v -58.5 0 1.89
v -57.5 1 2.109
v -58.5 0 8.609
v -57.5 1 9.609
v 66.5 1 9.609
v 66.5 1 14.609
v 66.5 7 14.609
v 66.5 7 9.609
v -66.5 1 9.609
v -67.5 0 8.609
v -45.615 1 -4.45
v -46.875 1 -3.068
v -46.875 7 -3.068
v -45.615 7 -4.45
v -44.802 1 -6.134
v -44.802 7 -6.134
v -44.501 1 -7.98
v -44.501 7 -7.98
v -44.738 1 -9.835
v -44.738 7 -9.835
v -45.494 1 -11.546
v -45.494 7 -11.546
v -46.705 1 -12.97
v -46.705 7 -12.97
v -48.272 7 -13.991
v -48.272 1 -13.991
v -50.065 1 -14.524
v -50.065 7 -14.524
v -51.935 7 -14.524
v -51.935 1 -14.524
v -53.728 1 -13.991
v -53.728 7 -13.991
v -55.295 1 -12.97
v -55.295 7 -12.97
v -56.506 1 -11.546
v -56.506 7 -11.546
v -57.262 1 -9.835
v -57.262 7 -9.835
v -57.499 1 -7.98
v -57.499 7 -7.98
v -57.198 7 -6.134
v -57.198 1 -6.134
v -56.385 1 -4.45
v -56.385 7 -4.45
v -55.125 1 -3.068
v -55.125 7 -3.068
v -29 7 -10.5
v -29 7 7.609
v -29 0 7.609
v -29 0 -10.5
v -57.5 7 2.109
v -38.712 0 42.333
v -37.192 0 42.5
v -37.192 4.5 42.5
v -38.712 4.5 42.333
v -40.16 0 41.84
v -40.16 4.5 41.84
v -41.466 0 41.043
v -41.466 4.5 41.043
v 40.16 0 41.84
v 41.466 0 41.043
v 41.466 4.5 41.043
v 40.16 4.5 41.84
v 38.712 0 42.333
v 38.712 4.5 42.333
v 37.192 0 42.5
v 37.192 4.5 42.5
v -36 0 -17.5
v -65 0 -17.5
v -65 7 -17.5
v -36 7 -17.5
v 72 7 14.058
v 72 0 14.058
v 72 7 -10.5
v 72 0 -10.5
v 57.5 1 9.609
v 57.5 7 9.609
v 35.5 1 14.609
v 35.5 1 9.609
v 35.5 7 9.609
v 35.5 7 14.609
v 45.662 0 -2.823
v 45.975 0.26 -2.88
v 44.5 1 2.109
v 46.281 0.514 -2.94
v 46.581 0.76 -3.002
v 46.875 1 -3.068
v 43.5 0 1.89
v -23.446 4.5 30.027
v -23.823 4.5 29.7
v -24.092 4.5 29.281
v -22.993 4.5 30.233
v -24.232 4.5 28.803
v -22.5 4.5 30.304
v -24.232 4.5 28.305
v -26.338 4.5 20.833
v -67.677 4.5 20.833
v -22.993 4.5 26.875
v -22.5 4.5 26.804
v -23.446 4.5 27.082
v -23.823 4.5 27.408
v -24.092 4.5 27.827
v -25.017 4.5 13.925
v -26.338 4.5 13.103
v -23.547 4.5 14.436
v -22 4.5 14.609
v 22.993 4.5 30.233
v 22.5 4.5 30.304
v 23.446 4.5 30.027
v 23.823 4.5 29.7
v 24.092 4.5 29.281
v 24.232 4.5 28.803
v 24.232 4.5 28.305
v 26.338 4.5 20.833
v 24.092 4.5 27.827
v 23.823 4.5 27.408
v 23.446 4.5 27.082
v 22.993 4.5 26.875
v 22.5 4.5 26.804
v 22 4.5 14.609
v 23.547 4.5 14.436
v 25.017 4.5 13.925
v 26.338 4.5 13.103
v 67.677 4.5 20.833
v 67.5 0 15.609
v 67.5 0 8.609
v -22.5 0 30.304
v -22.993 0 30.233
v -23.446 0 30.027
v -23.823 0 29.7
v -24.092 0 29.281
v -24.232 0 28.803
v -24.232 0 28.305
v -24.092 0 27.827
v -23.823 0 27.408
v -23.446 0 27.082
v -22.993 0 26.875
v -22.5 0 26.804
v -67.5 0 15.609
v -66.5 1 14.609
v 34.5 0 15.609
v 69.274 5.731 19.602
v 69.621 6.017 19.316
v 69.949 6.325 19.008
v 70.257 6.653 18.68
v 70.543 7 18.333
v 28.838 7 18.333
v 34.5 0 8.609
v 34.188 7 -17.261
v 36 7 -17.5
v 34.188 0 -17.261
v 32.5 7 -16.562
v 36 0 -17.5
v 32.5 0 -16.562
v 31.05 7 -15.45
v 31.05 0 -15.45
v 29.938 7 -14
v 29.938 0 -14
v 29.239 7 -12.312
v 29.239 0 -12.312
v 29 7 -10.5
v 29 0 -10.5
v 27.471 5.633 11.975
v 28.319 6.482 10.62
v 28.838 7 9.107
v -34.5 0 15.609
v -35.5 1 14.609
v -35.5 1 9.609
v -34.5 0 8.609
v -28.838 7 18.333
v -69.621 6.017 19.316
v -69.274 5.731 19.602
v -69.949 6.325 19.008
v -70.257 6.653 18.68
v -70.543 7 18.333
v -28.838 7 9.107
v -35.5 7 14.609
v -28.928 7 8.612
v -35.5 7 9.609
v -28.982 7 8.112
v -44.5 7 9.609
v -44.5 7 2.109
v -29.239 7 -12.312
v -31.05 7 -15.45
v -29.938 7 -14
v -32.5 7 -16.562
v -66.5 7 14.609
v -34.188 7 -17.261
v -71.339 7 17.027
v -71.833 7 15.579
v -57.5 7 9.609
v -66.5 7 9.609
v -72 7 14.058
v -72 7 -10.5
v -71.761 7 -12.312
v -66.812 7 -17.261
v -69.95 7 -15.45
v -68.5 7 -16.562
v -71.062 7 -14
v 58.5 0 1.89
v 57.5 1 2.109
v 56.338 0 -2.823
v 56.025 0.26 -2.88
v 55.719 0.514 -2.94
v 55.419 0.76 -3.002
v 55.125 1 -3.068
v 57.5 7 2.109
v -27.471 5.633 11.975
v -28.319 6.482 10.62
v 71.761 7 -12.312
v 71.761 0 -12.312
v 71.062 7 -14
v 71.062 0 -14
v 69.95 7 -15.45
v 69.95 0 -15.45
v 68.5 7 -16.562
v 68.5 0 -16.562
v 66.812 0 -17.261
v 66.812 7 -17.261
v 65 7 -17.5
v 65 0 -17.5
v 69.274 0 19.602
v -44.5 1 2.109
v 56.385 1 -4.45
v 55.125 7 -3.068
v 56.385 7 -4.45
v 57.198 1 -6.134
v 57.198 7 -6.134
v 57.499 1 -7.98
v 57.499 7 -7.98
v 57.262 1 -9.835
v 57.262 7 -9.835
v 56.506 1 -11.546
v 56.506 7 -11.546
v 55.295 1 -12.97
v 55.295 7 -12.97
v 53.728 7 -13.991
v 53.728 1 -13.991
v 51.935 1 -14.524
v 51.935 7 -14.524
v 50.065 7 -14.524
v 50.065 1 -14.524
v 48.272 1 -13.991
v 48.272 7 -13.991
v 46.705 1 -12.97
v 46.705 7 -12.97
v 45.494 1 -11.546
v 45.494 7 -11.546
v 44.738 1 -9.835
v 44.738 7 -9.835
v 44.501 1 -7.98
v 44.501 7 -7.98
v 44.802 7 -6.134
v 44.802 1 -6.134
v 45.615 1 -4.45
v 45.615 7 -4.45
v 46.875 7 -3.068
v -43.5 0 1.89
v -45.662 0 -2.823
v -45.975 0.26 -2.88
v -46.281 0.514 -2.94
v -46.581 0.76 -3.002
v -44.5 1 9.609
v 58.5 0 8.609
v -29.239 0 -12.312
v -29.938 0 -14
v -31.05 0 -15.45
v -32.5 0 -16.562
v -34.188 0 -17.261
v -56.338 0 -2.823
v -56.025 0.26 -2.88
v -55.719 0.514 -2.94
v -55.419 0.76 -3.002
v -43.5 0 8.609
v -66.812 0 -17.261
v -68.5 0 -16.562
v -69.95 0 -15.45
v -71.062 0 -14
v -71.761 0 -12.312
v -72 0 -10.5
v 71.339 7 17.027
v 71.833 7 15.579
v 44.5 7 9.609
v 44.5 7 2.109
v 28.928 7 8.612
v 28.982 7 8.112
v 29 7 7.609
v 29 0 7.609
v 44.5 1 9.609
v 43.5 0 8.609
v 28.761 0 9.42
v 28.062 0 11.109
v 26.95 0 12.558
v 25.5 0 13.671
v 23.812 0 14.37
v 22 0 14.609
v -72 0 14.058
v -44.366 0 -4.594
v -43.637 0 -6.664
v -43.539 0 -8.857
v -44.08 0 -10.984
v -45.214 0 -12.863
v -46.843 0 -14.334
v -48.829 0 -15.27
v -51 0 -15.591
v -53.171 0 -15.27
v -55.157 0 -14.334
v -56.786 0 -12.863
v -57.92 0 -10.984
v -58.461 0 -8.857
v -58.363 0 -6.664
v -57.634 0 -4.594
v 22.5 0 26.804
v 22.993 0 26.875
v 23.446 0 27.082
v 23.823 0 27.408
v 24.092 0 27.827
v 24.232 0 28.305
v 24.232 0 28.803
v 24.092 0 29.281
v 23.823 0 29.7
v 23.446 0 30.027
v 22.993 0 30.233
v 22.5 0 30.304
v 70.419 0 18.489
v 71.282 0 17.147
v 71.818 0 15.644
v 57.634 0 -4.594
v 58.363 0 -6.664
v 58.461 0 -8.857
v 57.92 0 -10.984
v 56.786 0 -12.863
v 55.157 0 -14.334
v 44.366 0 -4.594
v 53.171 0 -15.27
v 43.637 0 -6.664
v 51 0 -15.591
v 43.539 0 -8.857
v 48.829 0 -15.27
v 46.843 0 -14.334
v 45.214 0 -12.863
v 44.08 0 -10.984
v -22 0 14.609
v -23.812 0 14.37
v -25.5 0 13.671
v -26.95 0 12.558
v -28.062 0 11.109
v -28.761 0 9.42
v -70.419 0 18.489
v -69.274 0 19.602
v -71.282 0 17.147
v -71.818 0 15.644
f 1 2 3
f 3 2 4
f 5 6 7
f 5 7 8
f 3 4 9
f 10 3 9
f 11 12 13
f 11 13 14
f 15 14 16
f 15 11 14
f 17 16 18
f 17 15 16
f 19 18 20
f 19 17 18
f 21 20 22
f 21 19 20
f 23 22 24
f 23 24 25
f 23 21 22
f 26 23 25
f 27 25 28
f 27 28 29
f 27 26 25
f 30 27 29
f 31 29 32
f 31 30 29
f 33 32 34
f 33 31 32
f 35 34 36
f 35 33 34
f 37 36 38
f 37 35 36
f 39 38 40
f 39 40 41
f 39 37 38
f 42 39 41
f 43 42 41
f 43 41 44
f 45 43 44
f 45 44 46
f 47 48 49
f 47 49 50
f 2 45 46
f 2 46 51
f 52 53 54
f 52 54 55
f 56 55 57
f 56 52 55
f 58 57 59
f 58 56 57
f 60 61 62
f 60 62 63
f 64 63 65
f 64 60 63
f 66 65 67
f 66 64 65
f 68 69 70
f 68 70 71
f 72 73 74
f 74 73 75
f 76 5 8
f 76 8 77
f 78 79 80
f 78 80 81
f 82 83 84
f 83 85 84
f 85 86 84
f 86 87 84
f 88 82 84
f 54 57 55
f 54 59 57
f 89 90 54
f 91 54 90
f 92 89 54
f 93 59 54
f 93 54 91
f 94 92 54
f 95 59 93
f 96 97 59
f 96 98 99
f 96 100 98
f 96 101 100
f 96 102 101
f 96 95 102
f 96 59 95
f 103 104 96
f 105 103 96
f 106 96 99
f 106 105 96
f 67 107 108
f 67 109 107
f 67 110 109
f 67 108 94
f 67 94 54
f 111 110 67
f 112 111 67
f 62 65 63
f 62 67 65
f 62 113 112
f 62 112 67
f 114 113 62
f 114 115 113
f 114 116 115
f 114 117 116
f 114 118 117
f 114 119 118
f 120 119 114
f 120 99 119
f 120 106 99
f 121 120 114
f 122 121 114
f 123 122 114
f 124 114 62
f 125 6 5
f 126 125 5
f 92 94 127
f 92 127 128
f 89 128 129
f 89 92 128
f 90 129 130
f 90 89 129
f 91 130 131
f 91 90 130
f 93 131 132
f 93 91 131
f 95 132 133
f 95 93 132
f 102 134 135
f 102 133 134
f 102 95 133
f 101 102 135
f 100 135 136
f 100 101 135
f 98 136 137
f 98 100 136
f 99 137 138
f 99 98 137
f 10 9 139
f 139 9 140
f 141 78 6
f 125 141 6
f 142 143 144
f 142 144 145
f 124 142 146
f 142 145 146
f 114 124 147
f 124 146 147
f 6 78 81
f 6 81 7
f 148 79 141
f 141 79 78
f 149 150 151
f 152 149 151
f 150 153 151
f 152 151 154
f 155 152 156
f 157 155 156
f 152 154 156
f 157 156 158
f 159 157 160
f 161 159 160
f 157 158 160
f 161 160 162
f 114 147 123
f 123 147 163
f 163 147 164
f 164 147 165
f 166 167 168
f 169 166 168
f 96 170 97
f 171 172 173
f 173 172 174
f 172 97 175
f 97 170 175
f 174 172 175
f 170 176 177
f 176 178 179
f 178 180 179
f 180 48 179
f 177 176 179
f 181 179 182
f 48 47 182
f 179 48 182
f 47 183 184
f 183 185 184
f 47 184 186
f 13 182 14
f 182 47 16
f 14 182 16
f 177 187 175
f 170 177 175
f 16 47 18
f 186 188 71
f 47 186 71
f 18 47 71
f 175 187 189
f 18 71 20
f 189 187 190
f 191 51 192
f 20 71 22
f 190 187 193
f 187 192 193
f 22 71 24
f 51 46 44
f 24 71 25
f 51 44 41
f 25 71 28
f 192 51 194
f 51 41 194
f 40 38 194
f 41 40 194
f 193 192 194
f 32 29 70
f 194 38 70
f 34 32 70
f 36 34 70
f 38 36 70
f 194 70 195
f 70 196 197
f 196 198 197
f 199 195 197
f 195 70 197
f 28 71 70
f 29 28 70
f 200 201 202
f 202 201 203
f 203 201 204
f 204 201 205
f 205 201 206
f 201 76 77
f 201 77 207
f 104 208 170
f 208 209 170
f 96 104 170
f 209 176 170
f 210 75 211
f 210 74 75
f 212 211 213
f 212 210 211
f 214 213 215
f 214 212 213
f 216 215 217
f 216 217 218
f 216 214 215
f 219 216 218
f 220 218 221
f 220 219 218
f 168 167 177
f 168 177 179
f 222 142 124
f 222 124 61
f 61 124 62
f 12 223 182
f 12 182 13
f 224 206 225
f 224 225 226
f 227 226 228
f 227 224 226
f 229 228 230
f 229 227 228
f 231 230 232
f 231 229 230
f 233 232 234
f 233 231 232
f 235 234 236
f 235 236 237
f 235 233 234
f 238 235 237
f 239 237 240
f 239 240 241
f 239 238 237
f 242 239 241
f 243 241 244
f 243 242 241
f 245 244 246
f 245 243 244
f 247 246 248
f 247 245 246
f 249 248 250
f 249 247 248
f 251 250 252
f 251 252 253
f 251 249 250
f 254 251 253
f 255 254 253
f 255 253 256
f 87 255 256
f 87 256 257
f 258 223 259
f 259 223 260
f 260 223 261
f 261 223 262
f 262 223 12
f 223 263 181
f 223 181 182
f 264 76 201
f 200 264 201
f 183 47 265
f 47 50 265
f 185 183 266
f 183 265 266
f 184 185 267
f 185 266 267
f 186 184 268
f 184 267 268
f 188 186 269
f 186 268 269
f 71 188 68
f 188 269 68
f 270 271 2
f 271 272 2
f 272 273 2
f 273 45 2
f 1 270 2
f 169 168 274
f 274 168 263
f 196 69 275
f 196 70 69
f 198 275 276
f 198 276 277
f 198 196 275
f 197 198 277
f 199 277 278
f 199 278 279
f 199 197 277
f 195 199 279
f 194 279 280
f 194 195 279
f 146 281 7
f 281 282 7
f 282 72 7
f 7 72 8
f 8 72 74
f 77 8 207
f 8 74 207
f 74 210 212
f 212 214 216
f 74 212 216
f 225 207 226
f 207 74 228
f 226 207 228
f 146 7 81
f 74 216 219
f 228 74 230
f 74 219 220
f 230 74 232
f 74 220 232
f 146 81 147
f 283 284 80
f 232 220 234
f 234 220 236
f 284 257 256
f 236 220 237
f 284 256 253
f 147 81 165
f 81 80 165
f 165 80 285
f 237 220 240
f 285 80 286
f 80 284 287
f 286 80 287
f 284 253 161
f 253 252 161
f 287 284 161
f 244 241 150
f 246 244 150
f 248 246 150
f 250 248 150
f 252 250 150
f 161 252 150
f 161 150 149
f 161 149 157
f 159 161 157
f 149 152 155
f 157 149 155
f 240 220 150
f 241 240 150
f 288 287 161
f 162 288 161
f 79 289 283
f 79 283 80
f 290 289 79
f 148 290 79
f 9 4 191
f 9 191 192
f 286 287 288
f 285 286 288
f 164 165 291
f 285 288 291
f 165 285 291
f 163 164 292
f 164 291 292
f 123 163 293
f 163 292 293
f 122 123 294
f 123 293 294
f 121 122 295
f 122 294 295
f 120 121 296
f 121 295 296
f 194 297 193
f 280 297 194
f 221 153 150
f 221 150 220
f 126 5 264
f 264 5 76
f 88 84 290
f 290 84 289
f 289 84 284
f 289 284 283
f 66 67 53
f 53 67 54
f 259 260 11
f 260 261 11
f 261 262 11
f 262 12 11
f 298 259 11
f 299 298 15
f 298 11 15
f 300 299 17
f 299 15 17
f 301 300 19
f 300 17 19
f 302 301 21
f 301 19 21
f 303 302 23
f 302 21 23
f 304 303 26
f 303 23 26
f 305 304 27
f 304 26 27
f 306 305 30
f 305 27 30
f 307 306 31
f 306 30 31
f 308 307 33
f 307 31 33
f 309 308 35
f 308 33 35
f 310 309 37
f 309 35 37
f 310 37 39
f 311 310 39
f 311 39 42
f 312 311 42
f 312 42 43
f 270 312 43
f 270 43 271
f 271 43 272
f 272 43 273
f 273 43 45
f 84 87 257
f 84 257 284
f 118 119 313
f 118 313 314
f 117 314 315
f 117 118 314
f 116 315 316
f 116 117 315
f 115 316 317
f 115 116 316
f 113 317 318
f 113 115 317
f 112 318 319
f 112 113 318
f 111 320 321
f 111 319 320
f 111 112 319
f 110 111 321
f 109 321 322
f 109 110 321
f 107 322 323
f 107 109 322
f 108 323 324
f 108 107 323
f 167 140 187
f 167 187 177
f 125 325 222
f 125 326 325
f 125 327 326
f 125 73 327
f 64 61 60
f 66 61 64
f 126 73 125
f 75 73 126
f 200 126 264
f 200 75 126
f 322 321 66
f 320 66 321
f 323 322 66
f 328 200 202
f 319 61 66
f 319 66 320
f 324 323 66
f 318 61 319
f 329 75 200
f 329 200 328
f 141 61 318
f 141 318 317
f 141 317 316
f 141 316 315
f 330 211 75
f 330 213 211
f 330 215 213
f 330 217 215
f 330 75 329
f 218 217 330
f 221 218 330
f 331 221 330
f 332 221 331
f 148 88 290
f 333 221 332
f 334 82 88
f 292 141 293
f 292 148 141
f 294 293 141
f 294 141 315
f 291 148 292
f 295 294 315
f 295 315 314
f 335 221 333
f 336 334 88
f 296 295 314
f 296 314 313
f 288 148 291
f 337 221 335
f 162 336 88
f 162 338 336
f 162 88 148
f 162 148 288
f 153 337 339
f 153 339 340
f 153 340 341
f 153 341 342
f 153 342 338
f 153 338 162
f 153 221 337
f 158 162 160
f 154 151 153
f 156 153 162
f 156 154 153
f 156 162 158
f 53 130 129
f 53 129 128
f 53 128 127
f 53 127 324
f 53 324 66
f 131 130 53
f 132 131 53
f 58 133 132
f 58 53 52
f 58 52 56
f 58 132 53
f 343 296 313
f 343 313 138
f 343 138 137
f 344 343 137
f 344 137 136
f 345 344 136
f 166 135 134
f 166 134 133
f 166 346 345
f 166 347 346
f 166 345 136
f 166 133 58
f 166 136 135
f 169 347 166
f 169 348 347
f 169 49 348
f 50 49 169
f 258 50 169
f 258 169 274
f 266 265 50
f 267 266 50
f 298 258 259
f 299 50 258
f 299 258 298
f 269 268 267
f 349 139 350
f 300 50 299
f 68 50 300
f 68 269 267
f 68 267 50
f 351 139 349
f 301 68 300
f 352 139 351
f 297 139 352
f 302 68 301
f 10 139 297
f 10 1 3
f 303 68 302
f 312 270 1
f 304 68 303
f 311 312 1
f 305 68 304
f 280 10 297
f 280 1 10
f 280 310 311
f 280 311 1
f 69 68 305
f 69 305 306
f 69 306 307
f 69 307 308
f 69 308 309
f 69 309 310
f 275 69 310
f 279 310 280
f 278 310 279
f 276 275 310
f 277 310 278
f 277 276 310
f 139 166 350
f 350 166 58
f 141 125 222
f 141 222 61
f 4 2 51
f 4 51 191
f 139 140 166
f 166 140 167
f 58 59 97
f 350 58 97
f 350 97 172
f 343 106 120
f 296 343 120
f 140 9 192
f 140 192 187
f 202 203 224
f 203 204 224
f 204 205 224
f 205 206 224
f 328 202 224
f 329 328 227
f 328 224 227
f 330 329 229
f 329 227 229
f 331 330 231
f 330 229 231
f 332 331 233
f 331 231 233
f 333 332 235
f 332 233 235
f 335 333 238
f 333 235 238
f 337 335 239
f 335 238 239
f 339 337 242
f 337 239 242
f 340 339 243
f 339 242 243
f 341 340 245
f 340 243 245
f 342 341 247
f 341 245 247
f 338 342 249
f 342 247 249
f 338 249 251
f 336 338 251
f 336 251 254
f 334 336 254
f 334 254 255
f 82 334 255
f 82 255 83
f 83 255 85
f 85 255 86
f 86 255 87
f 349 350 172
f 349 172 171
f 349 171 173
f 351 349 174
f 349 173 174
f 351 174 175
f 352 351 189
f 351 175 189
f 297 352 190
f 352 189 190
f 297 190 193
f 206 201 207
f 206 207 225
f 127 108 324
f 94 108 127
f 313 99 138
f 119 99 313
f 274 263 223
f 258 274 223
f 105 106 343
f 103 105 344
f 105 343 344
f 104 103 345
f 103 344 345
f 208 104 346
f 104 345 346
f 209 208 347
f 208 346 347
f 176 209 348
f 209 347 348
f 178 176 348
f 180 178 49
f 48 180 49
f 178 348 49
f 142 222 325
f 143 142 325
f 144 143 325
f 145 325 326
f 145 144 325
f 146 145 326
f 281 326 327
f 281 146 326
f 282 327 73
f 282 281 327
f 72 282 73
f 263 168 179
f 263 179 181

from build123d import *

# Parameters (mm, degrees)
SKETCH1_W           = 144
SKETCH1_H           = 35
BOSS_EXTRUDE1_DEPTH = 7
BOSS_EXTRUDE2_DEPTH = 7
SKETCH8_W           = 58
SKETCH8_H           = 32.108669786
CUT_EXTRUDE5_DEPTH  = 84.900238379
FILLET1_R           = 7
CUT_EXTRUDE3_DEPTH  = 84.900238379
CUT_EXTRUDE4_DEPTH  = 2.5
CHAMFER2_SIZE       = 2.5
CHAMFER3_SIZE       = 1


with BuildPart() as part:
    # Sketch1 → Boss-Extrude1 (new body)
    with BuildSketch(Plane(origin=(0, 0, 0), x_dir=(1, 0, 0), z_dir=(0, 1, 0))):
        Rectangle(SKETCH1_W, SKETCH1_H)
        with BuildLine():
            Line((-55.125, 3.06794739), (-57.5, -2.108669786))
            Line((-57.5, -2.108669786), (-57.5, -9.608669786))
            Line((-57.5, -9.608669786), (-66.5, -9.608669786))
            Line((-66.5, -9.608669786), (-66.5, -14.608669786))
            Line((-66.5, -14.608669786), (-35.5, -14.608669786))
            Line((-35.5, -14.608669786), (-35.5, -9.608669786))
            Line((-35.5, -9.608669786), (-44.5, -9.608669786))
            Line((-44.5, -9.608669786), (-44.5, -2.108669786))
            Line((-44.5, -2.108669786), (-46.875, 3.06794739))
            ThreePointArc((-46.875, 3.06794739), (-51, 14.591330214), (-55.125, 3.06794739))
        make_face(mode=Mode.SUBTRACT)
        with BuildLine():
            Line((46.875, 3.06794739), (44.5, -2.108669786))
            Line((44.5, -2.108669786), (44.5, -9.608669786))
            Line((44.5, -9.608669786), (35.5, -9.608669786))
            Line((35.5, -9.608669786), (35.5, -14.608669786))
            Line((35.5, -14.608669786), (66.5, -14.608669786))
            Line((66.5, -14.608669786), (66.5, -9.608669786))
            Line((66.5, -9.608669786), (57.5, -9.608669786))
            Line((57.5, -9.608669786), (57.5, -2.108669786))
            Line((57.5, -2.108669786), (55.125, 3.06794739))
            ThreePointArc((55.125, 3.06794739), (51, 14.591330214), (46.875, 3.06794739))
        make_face(mode=Mode.SUBTRACT)
    extrude(amount=BOSS_EXTRUDE1_DEPTH)

    # Sketch6 → Boss-Extrude2 (add)
    with BuildSketch(Plane(origin=(0, 7, 0), x_dir=(1, 0, 0), z_dir=(0, 1, 0))):
        Polygon((72, -17.5), (39.577085299, -42.5), (-39.577085299, -42.5), (-72, -17.5), align=None)
    extrude(amount=-BOSS_EXTRUDE2_DEPTH)

    # Sketch8 → Cut-Extrude5 (cut, through all)
    with BuildSketch(Plane(origin=(0, 7, 0), x_dir=(1, 0, 0), z_dir=(0, 1, 0))):
        with Locations((0, 1.445665107)):
            Rectangle(SKETCH8_W, SKETCH8_H)
    extrude(amount=-CUT_EXTRUDE5_DEPTH, mode=Mode.SUBTRACT)

    # Fillet1
    fillet1_edges = [part.edges().sort_by_distance(p)[0] for p in [
        (29, 3.5, -17.5),
        (29, 3.5, 14.608669786),
        (-72, 3.5, -17.5),
        (72, 3.5, -17.5),
        (39.577085299, 3.5, 42.5),
        (-39.577085299, 3.5, 42.5),
        (72, 3.5, 17.5),
        (-72, 3.5, 17.5),
        (-29, 3.5, 14.608669786),
        (-29, 3.5, -17.5),
    ]]
    fillet(fillet1_edges, radius=FILLET1_R)

    # Sketch4 → Cut-Extrude3 (cut, through all)
    with BuildSketch(Plane(origin=(0, 7, 0), x_dir=(1, 0, 0), z_dir=(0, 1, 0))):
        with BuildLine():
            Line((-22.5, -26.804334893), (22.5, -26.804334893))
            ThreePointArc((22.5, -26.804334893), (24.25, -28.554334893), (22.5, -30.304334893))
            Line((22.5, -30.304334893), (-22.5, -30.304334893))
            ThreePointArc((-22.5, -30.304334893), (-24.25, -28.554334893), (-22.5, -26.804334893))
        make_face()
    extrude(amount=-CUT_EXTRUDE3_DEPTH, mode=Mode.SUBTRACT)

    # Sketch5 → Cut-Extrude4 (cut)
    with BuildSketch(Plane(origin=(0, 7, 0), x_dir=(1, 0, 0), z_dir=(0, 1, 0))):
        Polygon((-28.837742903, 35.825509873), (-28.837742903, -18.333082707), (-81.160450989, -18.333082707), (-81.160450989, -59.181512703), (81.160450989, -59.181512703), (81.160450989, -18.333082707), (28.837742903, -18.333082707), (28.837742903, 35.825509873), align=None)
    extrude(amount=-CUT_EXTRUDE4_DEPTH, mode=Mode.SUBTRACT)

    # Chamfer2
    chamfer2_edges = [part.edges().sort_by_distance(p)[0] for p in [
        (28.837742903, 4.5, 13.720087831),
        (49.690387643, 4.5, 18.333082707),
        (-28.837742903, 4.5, 13.720087831),
        (-49.690387643, 4.5, 18.333082707),
    ]]
    chamfer(chamfer2_edges, length=CHAMFER2_SIZE - 0.0001)  # a hair under: the kernel refuses the full size

    # Chamfer3
    chamfer3_edges = [part.edges().sort_by_distance(p)[0] for p in [
        (-51, 0, -14.591330214),
        (-56.3125, 0, -0.479638802),
        (-57.5, 0, 5.858669786),
        (-62, 0, 9.608669786),
        (-66.5, 0, 12.108669786),
        (-51, 0, 14.608669786),
        (-35.5, 0, 12.108669786),
        (-40, 0, 9.608669786),
        (-44.5, 0, 5.858669786),
        (-45.6875, 0, -0.479638802),
        (51, 0, -14.591330214),
        (45.6875, 0, -0.479638802),
        (44.5, 0, 5.858669786),
        (40, 0, 9.608669786),
        (35.5, 0, 12.108669786),
        (51, 0, 14.608669786),
        (66.5, 0, 12.108669786),
        (62, 0, 9.608669786),
        (57.5, 0, 5.858669786),
        (56.3125, 0, -0.479638802),
    ]]
    chamfer(chamfer3_edges, length=CHAMFER3_SIZE)


solid = part.part
